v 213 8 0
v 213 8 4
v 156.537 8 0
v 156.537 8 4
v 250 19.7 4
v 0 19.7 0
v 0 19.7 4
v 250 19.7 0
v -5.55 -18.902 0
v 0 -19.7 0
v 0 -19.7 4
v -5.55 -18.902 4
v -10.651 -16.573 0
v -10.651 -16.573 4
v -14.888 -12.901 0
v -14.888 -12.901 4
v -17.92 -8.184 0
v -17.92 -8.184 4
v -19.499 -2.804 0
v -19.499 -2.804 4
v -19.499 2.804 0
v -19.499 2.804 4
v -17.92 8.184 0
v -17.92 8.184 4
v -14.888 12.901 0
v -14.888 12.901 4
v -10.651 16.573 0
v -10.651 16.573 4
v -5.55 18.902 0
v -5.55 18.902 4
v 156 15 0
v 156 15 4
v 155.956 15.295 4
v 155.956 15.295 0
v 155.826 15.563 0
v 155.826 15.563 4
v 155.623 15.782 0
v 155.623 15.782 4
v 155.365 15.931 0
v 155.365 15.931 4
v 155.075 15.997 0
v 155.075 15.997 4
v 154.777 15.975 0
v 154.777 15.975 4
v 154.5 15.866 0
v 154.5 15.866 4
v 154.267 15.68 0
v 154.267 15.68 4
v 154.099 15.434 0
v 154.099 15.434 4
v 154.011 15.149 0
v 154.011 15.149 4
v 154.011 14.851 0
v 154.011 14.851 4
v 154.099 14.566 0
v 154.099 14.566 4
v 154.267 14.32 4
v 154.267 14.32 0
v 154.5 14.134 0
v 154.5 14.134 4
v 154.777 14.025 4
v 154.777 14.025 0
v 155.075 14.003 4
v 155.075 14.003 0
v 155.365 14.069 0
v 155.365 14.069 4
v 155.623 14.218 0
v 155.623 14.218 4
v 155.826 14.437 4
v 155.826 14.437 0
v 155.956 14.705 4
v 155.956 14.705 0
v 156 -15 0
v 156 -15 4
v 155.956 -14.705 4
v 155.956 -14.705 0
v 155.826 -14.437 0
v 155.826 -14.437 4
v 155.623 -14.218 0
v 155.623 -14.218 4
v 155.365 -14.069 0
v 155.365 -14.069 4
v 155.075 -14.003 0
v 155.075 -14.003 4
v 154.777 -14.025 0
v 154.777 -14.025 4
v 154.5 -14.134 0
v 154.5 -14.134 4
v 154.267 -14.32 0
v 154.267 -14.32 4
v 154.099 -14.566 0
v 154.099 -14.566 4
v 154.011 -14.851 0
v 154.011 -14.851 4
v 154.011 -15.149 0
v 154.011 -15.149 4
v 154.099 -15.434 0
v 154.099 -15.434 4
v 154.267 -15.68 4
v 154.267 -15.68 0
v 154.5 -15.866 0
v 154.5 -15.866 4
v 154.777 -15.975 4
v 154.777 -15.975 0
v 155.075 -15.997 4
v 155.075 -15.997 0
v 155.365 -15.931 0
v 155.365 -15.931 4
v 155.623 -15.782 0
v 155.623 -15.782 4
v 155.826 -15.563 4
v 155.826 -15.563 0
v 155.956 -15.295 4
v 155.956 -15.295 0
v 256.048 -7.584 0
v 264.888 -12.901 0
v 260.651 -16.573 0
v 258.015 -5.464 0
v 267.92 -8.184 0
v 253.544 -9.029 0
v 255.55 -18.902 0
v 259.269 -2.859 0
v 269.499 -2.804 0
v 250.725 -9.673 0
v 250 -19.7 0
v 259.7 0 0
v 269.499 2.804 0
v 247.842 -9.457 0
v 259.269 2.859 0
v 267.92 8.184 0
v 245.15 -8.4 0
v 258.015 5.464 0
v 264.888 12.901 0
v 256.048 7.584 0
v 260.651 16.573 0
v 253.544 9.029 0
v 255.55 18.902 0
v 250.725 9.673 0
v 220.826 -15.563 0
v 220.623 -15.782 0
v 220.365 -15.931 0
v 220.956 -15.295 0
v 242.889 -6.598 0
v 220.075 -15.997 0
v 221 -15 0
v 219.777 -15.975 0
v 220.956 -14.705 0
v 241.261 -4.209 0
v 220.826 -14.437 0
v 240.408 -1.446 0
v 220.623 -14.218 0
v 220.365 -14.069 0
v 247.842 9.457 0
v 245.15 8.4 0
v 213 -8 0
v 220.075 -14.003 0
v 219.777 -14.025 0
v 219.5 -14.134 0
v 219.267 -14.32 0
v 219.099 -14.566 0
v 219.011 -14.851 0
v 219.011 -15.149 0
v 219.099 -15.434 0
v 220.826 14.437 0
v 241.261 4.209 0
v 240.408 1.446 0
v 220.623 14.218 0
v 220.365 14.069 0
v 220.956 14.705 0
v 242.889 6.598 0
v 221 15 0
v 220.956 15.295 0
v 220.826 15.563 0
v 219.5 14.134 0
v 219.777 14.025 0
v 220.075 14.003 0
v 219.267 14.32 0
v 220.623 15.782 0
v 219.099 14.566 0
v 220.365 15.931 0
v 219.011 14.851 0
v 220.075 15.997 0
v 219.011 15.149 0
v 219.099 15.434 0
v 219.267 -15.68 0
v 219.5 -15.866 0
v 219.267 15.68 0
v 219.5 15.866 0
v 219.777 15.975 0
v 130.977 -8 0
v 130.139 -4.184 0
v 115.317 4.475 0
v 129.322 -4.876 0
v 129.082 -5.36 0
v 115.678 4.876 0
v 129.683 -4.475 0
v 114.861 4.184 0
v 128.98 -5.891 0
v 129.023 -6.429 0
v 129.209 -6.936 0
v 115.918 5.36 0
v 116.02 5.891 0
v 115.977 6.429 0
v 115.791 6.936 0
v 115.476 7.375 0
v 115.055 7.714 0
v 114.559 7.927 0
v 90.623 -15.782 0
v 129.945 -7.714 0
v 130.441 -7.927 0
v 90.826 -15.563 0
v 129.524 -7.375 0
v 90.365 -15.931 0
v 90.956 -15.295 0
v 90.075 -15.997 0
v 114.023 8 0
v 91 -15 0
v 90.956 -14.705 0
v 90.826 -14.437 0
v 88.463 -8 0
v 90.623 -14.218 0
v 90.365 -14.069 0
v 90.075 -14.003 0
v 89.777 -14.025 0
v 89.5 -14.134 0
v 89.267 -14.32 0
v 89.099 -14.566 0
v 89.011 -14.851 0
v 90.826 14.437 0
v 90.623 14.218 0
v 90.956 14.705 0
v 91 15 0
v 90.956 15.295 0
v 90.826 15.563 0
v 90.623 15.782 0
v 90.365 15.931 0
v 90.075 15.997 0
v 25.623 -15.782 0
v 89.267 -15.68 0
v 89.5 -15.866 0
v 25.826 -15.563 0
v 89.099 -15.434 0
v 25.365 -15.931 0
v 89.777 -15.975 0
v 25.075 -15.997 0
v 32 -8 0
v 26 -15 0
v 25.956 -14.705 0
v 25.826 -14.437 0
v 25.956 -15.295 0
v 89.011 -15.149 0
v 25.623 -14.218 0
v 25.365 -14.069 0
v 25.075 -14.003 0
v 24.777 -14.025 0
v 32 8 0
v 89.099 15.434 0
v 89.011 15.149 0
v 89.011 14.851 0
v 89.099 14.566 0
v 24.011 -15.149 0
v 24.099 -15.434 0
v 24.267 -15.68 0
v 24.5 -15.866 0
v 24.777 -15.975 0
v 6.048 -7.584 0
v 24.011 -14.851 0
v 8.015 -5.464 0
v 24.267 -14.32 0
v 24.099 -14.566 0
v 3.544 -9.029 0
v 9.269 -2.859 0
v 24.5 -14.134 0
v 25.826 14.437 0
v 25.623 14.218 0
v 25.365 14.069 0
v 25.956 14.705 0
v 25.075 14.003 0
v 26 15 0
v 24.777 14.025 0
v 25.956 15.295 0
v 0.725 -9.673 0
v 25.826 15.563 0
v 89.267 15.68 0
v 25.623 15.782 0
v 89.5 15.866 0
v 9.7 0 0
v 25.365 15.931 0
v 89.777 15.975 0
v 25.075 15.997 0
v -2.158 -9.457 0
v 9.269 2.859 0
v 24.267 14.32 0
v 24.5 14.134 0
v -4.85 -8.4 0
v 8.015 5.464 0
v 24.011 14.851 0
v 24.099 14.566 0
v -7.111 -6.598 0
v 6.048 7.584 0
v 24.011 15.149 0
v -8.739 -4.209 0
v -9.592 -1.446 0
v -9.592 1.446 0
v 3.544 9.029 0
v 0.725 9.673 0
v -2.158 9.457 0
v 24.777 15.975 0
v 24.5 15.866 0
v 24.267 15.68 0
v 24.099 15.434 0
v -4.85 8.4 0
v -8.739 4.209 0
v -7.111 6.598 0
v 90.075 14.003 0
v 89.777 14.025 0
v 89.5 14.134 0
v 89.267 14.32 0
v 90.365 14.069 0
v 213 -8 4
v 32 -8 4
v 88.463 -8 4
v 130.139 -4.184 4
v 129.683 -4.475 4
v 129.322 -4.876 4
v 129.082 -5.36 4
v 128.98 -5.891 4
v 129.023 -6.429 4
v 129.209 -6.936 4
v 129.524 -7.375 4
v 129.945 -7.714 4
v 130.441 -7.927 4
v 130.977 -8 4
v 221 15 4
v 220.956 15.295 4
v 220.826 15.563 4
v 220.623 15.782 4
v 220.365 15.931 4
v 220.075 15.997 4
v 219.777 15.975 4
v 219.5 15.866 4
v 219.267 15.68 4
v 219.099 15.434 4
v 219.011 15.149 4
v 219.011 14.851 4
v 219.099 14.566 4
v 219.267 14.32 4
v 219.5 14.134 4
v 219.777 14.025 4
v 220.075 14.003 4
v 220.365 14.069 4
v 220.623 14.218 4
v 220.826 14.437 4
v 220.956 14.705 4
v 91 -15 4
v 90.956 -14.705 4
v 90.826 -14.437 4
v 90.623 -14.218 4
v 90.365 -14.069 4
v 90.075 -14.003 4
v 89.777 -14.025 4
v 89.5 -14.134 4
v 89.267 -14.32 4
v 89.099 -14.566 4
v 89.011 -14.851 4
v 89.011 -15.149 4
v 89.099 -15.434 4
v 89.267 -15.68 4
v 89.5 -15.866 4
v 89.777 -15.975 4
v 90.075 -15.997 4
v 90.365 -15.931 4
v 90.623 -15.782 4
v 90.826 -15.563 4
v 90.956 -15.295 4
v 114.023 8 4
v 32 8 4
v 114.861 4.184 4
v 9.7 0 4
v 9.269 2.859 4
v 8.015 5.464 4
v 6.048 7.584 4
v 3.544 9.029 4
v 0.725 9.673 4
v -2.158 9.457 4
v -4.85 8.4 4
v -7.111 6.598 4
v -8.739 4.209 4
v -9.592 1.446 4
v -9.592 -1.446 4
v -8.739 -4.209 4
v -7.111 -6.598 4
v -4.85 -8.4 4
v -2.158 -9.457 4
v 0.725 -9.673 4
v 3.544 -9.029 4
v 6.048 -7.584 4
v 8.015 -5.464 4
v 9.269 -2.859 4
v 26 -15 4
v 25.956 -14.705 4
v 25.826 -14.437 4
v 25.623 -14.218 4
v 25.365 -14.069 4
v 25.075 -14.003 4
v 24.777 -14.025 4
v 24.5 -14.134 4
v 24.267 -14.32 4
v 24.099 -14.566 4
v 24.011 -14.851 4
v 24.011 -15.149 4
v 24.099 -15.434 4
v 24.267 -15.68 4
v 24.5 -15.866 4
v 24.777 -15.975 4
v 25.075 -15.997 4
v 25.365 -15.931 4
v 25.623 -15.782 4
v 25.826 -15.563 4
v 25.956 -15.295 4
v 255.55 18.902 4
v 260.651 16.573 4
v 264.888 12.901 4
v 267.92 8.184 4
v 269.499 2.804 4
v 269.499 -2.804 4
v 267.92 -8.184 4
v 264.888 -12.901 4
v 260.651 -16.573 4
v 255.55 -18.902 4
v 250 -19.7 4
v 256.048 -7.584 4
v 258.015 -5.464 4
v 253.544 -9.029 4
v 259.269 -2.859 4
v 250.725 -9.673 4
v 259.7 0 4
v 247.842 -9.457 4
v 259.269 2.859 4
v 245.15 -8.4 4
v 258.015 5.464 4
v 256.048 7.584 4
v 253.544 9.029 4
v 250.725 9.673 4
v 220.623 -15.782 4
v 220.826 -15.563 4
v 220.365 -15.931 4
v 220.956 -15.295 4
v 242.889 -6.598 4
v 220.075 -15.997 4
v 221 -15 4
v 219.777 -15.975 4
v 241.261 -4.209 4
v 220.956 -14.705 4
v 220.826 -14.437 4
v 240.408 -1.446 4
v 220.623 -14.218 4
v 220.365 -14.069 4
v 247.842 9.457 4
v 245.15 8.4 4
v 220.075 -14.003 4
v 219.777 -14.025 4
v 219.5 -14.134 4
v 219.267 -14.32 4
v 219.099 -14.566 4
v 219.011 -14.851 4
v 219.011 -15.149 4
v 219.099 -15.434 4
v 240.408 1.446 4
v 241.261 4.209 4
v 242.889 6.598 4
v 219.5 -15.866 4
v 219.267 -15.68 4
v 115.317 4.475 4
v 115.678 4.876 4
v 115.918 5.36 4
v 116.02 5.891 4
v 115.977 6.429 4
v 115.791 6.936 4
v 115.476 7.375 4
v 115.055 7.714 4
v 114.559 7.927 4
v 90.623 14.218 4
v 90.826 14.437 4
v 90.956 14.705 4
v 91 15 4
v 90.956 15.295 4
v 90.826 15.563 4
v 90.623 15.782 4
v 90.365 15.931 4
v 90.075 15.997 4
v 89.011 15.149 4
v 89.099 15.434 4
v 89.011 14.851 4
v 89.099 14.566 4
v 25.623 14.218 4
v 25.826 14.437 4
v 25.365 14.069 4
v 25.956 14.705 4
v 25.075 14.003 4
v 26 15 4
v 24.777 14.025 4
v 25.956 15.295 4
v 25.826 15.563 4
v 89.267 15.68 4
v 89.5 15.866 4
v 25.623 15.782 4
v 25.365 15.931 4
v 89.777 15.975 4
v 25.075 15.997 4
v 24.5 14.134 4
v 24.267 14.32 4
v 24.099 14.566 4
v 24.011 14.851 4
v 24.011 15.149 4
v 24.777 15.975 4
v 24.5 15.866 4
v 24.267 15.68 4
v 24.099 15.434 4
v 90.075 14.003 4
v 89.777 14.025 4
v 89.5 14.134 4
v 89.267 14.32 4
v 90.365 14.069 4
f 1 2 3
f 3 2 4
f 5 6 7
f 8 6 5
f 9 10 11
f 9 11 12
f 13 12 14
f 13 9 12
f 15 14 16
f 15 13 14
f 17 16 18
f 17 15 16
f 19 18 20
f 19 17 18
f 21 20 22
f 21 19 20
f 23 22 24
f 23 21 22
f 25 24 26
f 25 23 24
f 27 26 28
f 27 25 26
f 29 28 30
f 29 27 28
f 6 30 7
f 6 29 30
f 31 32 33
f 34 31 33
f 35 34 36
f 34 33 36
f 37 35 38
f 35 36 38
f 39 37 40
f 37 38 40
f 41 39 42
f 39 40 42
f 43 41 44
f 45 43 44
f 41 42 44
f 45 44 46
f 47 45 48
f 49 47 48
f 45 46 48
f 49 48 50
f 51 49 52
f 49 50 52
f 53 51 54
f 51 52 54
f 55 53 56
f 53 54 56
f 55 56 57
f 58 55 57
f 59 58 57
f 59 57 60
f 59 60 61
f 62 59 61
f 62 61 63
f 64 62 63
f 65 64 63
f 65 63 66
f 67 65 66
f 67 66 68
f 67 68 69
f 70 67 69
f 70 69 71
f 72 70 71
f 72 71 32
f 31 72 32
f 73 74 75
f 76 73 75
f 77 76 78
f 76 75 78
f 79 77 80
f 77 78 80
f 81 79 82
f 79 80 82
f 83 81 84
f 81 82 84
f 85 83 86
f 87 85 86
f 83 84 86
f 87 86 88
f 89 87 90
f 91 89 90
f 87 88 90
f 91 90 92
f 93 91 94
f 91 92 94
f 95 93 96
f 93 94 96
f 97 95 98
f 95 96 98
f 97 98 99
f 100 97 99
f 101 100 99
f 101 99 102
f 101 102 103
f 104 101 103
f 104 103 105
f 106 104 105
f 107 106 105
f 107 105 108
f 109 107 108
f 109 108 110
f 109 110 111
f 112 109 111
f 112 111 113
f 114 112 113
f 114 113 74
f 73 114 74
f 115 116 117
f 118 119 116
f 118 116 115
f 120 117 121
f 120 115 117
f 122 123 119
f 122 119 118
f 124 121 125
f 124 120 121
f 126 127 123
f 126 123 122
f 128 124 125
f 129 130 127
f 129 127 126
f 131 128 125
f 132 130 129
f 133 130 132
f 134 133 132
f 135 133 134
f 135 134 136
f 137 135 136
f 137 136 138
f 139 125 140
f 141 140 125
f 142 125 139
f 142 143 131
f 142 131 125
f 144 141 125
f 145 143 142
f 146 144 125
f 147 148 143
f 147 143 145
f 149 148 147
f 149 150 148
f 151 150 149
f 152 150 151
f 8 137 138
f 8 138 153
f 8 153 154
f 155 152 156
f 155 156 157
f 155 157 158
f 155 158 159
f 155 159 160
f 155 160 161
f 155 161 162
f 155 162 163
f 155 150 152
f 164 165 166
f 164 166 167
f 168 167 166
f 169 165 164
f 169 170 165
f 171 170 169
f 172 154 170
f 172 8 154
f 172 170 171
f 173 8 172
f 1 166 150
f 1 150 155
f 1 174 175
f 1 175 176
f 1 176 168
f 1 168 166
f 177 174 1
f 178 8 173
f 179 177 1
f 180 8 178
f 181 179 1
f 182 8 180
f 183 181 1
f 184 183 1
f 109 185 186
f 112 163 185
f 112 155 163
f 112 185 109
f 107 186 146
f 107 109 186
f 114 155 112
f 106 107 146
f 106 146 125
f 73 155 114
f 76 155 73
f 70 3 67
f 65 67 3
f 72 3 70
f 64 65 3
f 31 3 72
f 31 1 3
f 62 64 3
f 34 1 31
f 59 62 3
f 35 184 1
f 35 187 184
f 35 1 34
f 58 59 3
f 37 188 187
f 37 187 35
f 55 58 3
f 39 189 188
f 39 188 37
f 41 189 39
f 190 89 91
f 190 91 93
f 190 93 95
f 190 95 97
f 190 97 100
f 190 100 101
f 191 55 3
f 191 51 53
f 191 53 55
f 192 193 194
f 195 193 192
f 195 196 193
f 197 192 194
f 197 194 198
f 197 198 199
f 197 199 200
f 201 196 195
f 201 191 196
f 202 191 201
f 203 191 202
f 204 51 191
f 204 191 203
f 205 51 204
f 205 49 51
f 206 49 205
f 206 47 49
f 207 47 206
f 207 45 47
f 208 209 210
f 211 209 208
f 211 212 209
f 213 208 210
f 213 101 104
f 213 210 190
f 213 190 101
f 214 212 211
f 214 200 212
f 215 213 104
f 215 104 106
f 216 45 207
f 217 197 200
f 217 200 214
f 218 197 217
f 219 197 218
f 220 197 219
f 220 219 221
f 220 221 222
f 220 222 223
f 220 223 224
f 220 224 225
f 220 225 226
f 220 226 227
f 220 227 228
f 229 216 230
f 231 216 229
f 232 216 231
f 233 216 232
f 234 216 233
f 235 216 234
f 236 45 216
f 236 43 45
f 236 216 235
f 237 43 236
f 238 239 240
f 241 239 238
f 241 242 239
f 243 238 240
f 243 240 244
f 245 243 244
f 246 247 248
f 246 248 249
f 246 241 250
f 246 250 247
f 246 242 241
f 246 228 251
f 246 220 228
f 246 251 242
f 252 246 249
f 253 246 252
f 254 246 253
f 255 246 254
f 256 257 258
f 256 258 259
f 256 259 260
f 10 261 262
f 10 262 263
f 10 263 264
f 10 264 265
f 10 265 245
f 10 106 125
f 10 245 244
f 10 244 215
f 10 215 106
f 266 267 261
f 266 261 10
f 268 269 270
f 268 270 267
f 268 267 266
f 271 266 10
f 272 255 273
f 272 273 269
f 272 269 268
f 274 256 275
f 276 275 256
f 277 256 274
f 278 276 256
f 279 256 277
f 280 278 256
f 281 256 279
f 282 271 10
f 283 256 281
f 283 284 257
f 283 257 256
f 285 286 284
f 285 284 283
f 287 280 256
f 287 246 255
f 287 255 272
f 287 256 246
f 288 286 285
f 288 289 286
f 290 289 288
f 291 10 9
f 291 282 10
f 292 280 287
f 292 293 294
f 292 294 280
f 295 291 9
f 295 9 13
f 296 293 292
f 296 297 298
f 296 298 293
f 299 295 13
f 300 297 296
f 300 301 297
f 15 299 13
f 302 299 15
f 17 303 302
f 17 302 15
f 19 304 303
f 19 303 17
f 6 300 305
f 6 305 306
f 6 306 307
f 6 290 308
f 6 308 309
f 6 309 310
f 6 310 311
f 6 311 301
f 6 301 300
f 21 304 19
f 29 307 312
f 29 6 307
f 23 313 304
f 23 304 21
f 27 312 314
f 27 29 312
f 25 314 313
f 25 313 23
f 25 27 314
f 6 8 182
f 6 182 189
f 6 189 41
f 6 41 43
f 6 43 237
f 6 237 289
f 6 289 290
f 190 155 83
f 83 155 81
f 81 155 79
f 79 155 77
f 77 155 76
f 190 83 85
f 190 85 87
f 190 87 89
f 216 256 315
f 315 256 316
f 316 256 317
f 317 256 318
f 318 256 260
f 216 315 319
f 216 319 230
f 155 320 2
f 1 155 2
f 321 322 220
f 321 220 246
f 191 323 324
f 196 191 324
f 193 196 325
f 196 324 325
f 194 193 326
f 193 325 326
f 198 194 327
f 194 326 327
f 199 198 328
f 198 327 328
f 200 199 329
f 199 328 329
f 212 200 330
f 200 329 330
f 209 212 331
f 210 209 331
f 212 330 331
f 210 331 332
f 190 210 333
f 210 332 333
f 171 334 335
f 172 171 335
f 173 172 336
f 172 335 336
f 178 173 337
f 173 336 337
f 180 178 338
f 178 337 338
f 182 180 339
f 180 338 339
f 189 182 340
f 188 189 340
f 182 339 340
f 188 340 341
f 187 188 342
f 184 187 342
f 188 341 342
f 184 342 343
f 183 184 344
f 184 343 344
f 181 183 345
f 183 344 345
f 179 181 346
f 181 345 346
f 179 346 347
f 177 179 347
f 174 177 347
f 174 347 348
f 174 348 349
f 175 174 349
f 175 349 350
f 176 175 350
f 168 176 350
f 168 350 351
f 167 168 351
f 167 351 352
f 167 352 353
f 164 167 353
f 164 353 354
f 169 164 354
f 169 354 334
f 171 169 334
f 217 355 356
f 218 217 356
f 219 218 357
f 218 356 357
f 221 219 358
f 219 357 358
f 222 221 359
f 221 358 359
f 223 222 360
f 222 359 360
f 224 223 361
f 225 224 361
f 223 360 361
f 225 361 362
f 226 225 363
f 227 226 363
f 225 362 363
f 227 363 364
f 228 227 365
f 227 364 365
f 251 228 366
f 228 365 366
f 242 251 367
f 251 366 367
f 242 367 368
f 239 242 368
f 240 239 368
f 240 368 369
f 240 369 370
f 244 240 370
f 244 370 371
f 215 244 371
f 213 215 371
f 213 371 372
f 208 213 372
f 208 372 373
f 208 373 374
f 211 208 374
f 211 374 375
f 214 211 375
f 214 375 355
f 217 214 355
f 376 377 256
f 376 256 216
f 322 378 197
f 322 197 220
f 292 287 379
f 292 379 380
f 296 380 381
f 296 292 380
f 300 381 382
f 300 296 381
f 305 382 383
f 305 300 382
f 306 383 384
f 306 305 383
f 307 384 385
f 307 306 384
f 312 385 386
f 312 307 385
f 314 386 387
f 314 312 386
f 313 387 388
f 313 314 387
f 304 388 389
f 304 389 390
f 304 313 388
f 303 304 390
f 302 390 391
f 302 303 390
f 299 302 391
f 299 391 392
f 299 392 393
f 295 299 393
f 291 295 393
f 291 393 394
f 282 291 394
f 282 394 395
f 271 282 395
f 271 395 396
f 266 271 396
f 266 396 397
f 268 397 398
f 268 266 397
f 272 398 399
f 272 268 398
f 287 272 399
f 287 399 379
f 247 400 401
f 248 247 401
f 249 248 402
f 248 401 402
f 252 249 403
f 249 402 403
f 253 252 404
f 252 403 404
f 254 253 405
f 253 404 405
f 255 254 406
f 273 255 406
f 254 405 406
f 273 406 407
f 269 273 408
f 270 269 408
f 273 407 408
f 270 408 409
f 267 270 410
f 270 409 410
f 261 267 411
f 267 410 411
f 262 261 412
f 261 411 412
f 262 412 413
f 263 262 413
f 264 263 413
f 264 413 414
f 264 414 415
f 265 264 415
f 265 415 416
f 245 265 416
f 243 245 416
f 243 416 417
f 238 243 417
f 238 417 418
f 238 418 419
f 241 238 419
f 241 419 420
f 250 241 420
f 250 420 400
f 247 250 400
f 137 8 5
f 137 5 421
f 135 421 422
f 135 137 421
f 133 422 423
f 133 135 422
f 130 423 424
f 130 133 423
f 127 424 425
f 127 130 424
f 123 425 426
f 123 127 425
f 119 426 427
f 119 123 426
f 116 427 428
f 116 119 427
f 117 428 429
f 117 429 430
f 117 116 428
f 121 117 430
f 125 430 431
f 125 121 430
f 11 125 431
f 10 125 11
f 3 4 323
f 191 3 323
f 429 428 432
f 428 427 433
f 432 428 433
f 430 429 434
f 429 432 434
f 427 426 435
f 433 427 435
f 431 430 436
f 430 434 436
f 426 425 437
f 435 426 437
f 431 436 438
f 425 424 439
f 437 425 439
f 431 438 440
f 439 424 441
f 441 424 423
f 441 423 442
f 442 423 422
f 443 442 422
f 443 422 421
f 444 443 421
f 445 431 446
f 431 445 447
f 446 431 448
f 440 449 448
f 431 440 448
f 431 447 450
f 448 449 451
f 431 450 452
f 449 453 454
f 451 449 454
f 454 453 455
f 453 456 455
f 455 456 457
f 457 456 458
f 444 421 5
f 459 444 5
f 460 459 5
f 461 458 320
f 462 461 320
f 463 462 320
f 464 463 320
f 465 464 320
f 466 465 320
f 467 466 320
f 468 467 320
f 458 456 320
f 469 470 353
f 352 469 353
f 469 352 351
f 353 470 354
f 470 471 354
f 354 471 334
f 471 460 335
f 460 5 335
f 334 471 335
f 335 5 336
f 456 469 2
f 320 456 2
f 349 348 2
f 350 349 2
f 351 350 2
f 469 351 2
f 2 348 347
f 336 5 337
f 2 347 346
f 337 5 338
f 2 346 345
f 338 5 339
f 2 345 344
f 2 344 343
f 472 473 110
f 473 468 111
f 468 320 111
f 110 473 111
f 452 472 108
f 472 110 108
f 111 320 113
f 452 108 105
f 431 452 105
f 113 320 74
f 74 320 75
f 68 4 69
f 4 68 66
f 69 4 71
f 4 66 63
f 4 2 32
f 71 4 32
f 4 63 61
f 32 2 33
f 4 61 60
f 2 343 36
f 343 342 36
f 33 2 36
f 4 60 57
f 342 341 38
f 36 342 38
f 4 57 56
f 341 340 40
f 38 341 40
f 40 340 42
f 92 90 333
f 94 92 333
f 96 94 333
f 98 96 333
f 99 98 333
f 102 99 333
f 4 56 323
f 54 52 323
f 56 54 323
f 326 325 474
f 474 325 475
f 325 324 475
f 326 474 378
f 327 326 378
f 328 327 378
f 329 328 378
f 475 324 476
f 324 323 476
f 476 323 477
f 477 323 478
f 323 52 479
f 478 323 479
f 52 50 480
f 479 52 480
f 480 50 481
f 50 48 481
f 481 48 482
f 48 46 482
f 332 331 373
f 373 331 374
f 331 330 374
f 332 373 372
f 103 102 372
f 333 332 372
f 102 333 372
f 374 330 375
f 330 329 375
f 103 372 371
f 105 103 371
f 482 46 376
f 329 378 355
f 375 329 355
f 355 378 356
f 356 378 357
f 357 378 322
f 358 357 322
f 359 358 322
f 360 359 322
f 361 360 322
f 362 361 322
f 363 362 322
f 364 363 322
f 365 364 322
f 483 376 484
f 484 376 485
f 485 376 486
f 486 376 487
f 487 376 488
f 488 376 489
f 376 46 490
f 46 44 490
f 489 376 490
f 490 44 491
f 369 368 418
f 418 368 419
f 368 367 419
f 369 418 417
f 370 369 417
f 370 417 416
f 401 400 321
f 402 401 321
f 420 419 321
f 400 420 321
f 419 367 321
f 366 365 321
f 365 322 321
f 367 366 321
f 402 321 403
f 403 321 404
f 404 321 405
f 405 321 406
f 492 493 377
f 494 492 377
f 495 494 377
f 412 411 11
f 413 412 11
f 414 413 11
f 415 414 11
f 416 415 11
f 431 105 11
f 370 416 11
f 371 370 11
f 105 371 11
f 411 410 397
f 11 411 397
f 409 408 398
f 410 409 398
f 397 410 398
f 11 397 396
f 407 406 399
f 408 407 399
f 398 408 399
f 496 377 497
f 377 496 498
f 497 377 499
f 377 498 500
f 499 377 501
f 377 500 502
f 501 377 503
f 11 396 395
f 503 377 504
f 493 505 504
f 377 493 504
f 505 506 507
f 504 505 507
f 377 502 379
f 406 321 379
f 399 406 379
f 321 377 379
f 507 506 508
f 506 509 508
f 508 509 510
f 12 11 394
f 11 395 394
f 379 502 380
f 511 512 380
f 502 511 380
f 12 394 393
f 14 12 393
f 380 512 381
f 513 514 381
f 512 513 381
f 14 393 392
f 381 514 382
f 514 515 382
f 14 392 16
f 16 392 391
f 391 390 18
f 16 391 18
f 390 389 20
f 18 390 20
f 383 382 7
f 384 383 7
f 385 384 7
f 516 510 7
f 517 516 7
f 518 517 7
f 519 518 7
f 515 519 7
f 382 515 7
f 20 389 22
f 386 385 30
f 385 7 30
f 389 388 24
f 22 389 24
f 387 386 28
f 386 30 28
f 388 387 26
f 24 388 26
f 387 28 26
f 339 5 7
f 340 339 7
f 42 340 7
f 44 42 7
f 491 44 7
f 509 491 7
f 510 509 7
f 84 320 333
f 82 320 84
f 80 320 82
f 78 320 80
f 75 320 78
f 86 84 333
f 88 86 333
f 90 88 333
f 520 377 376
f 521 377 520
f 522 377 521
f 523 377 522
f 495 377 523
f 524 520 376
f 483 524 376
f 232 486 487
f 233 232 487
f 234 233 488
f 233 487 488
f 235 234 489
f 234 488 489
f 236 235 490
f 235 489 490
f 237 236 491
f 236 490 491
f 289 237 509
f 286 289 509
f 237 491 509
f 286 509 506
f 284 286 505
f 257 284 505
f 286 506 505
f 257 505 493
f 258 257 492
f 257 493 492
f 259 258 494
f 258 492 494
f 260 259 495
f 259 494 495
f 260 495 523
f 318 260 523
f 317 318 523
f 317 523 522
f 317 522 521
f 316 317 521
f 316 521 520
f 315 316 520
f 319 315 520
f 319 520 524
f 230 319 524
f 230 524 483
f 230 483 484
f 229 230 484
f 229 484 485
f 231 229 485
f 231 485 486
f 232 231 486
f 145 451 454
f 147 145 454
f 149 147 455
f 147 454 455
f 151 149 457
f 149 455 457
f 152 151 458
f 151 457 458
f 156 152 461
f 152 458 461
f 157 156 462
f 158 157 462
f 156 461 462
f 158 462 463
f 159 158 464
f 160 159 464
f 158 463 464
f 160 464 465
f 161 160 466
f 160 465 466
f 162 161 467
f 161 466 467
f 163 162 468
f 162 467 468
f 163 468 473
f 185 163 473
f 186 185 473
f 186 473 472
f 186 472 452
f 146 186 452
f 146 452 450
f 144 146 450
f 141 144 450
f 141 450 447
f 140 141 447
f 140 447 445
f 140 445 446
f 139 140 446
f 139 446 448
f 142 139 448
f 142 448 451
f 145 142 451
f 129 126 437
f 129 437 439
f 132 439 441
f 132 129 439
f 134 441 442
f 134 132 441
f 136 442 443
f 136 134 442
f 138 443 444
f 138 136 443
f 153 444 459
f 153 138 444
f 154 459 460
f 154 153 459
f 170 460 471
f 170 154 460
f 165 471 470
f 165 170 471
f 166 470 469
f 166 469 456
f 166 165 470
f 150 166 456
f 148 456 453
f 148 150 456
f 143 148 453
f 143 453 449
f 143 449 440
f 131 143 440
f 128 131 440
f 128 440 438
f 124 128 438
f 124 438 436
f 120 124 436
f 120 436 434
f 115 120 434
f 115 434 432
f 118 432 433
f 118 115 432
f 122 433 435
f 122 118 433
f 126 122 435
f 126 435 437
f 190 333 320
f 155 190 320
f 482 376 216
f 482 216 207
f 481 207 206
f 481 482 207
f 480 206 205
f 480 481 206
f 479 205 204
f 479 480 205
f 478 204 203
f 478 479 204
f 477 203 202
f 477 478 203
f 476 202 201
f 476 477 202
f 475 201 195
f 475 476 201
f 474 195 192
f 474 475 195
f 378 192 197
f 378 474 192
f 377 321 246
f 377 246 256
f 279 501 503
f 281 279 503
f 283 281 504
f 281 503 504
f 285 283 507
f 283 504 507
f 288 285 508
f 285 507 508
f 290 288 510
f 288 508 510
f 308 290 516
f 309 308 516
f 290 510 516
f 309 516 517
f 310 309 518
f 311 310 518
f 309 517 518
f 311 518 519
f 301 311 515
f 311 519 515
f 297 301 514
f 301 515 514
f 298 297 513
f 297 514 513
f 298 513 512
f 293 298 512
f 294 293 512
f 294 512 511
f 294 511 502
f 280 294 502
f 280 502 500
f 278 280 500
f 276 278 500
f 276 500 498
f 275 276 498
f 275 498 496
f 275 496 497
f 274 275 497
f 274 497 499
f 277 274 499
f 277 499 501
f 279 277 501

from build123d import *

# Parameters (mm, degrees)
SKETCH_1_R          = 9.7
EXTRUDE_1_DEPTH     = 4
SKETCH_2_R          = 1
CUT_EXTRUDE_1_DEPTH = 10
CUT_EXTRUDE_2_DEPTH = 10


with BuildPart() as part:
    # 草图1 → 凸台-拉伸1 (new body)
    with BuildSketch(Plane.XY):
        with BuildLine():
            Line((0, 19.7), (250, 19.7))
            ThreePointArc((250, 19.7), (269.7, 0), (250, -19.7))
            Line((250, -19.7), (0, -19.7))
            ThreePointArc((0, -19.7), (-19.7, 0), (0, 19.7))
        make_face()
        Circle(SKETCH_1_R, mode=Mode.SUBTRACT)
        with Locations((250, 0)):
            Circle(SKETCH_1_R, mode=Mode.SUBTRACT)
    extrude(amount=EXTRUDE_1_DEPTH)

    # 草图2 → 切除-拉伸1 (cut)
    with BuildSketch(Plane.XY.offset(4)):
        with Locations((25, 15)):
            Circle(SKETCH_2_R)
        with Locations((90, 15)):
            Circle(SKETCH_2_R)
        with Locations((155, 15)):
            Circle(SKETCH_2_R)
        with Locations((220, 15)):
            Circle(SKETCH_2_R)
        with Locations((90, -15)):
            Circle(SKETCH_2_R)
        with Locations((155, -15)):
            Circle(SKETCH_2_R)
        with Locations((220, -15)):
            Circle(SKETCH_2_R)
        with Locations((25, -15)):
            Circle(SKETCH_2_R)
    extrude(amount=-CUT_EXTRUDE_1_DEPTH, mode=Mode.SUBTRACT)

    # 草图3 → 切除-拉伸2 (cut)
    with BuildSketch(Plane.XY.offset(4)):
        with BuildLine():
            Line((32, 8), (114.023268405, 8))
            ThreePointArc((114.023268405, 8), (115.976706085, 6.429046887), (114.86138476, 4.184081231))
            Line((114.86138476, 4.184081231), (88.462542093, -8))
            Line((88.462542093, -8), (32, -8))
            Line((32, -8), (32, 8))
        make_face()
        with BuildLine():
            Line((156.537457907, 8), (130.13861524, -4.184081231))
            ThreePointArc((130.13861524, -4.184081231), (129.023293915, -6.429046887), (130.976731595, -8))
            Line((130.976731595, -8), (213, -8))
            Line((213, -8), (213, 8))
            Line((213, 8), (156.537457907, 8))
        make_face()
    extrude(amount=-CUT_EXTRUDE_2_DEPTH, mode=Mode.SUBTRACT)


solid = part.part
